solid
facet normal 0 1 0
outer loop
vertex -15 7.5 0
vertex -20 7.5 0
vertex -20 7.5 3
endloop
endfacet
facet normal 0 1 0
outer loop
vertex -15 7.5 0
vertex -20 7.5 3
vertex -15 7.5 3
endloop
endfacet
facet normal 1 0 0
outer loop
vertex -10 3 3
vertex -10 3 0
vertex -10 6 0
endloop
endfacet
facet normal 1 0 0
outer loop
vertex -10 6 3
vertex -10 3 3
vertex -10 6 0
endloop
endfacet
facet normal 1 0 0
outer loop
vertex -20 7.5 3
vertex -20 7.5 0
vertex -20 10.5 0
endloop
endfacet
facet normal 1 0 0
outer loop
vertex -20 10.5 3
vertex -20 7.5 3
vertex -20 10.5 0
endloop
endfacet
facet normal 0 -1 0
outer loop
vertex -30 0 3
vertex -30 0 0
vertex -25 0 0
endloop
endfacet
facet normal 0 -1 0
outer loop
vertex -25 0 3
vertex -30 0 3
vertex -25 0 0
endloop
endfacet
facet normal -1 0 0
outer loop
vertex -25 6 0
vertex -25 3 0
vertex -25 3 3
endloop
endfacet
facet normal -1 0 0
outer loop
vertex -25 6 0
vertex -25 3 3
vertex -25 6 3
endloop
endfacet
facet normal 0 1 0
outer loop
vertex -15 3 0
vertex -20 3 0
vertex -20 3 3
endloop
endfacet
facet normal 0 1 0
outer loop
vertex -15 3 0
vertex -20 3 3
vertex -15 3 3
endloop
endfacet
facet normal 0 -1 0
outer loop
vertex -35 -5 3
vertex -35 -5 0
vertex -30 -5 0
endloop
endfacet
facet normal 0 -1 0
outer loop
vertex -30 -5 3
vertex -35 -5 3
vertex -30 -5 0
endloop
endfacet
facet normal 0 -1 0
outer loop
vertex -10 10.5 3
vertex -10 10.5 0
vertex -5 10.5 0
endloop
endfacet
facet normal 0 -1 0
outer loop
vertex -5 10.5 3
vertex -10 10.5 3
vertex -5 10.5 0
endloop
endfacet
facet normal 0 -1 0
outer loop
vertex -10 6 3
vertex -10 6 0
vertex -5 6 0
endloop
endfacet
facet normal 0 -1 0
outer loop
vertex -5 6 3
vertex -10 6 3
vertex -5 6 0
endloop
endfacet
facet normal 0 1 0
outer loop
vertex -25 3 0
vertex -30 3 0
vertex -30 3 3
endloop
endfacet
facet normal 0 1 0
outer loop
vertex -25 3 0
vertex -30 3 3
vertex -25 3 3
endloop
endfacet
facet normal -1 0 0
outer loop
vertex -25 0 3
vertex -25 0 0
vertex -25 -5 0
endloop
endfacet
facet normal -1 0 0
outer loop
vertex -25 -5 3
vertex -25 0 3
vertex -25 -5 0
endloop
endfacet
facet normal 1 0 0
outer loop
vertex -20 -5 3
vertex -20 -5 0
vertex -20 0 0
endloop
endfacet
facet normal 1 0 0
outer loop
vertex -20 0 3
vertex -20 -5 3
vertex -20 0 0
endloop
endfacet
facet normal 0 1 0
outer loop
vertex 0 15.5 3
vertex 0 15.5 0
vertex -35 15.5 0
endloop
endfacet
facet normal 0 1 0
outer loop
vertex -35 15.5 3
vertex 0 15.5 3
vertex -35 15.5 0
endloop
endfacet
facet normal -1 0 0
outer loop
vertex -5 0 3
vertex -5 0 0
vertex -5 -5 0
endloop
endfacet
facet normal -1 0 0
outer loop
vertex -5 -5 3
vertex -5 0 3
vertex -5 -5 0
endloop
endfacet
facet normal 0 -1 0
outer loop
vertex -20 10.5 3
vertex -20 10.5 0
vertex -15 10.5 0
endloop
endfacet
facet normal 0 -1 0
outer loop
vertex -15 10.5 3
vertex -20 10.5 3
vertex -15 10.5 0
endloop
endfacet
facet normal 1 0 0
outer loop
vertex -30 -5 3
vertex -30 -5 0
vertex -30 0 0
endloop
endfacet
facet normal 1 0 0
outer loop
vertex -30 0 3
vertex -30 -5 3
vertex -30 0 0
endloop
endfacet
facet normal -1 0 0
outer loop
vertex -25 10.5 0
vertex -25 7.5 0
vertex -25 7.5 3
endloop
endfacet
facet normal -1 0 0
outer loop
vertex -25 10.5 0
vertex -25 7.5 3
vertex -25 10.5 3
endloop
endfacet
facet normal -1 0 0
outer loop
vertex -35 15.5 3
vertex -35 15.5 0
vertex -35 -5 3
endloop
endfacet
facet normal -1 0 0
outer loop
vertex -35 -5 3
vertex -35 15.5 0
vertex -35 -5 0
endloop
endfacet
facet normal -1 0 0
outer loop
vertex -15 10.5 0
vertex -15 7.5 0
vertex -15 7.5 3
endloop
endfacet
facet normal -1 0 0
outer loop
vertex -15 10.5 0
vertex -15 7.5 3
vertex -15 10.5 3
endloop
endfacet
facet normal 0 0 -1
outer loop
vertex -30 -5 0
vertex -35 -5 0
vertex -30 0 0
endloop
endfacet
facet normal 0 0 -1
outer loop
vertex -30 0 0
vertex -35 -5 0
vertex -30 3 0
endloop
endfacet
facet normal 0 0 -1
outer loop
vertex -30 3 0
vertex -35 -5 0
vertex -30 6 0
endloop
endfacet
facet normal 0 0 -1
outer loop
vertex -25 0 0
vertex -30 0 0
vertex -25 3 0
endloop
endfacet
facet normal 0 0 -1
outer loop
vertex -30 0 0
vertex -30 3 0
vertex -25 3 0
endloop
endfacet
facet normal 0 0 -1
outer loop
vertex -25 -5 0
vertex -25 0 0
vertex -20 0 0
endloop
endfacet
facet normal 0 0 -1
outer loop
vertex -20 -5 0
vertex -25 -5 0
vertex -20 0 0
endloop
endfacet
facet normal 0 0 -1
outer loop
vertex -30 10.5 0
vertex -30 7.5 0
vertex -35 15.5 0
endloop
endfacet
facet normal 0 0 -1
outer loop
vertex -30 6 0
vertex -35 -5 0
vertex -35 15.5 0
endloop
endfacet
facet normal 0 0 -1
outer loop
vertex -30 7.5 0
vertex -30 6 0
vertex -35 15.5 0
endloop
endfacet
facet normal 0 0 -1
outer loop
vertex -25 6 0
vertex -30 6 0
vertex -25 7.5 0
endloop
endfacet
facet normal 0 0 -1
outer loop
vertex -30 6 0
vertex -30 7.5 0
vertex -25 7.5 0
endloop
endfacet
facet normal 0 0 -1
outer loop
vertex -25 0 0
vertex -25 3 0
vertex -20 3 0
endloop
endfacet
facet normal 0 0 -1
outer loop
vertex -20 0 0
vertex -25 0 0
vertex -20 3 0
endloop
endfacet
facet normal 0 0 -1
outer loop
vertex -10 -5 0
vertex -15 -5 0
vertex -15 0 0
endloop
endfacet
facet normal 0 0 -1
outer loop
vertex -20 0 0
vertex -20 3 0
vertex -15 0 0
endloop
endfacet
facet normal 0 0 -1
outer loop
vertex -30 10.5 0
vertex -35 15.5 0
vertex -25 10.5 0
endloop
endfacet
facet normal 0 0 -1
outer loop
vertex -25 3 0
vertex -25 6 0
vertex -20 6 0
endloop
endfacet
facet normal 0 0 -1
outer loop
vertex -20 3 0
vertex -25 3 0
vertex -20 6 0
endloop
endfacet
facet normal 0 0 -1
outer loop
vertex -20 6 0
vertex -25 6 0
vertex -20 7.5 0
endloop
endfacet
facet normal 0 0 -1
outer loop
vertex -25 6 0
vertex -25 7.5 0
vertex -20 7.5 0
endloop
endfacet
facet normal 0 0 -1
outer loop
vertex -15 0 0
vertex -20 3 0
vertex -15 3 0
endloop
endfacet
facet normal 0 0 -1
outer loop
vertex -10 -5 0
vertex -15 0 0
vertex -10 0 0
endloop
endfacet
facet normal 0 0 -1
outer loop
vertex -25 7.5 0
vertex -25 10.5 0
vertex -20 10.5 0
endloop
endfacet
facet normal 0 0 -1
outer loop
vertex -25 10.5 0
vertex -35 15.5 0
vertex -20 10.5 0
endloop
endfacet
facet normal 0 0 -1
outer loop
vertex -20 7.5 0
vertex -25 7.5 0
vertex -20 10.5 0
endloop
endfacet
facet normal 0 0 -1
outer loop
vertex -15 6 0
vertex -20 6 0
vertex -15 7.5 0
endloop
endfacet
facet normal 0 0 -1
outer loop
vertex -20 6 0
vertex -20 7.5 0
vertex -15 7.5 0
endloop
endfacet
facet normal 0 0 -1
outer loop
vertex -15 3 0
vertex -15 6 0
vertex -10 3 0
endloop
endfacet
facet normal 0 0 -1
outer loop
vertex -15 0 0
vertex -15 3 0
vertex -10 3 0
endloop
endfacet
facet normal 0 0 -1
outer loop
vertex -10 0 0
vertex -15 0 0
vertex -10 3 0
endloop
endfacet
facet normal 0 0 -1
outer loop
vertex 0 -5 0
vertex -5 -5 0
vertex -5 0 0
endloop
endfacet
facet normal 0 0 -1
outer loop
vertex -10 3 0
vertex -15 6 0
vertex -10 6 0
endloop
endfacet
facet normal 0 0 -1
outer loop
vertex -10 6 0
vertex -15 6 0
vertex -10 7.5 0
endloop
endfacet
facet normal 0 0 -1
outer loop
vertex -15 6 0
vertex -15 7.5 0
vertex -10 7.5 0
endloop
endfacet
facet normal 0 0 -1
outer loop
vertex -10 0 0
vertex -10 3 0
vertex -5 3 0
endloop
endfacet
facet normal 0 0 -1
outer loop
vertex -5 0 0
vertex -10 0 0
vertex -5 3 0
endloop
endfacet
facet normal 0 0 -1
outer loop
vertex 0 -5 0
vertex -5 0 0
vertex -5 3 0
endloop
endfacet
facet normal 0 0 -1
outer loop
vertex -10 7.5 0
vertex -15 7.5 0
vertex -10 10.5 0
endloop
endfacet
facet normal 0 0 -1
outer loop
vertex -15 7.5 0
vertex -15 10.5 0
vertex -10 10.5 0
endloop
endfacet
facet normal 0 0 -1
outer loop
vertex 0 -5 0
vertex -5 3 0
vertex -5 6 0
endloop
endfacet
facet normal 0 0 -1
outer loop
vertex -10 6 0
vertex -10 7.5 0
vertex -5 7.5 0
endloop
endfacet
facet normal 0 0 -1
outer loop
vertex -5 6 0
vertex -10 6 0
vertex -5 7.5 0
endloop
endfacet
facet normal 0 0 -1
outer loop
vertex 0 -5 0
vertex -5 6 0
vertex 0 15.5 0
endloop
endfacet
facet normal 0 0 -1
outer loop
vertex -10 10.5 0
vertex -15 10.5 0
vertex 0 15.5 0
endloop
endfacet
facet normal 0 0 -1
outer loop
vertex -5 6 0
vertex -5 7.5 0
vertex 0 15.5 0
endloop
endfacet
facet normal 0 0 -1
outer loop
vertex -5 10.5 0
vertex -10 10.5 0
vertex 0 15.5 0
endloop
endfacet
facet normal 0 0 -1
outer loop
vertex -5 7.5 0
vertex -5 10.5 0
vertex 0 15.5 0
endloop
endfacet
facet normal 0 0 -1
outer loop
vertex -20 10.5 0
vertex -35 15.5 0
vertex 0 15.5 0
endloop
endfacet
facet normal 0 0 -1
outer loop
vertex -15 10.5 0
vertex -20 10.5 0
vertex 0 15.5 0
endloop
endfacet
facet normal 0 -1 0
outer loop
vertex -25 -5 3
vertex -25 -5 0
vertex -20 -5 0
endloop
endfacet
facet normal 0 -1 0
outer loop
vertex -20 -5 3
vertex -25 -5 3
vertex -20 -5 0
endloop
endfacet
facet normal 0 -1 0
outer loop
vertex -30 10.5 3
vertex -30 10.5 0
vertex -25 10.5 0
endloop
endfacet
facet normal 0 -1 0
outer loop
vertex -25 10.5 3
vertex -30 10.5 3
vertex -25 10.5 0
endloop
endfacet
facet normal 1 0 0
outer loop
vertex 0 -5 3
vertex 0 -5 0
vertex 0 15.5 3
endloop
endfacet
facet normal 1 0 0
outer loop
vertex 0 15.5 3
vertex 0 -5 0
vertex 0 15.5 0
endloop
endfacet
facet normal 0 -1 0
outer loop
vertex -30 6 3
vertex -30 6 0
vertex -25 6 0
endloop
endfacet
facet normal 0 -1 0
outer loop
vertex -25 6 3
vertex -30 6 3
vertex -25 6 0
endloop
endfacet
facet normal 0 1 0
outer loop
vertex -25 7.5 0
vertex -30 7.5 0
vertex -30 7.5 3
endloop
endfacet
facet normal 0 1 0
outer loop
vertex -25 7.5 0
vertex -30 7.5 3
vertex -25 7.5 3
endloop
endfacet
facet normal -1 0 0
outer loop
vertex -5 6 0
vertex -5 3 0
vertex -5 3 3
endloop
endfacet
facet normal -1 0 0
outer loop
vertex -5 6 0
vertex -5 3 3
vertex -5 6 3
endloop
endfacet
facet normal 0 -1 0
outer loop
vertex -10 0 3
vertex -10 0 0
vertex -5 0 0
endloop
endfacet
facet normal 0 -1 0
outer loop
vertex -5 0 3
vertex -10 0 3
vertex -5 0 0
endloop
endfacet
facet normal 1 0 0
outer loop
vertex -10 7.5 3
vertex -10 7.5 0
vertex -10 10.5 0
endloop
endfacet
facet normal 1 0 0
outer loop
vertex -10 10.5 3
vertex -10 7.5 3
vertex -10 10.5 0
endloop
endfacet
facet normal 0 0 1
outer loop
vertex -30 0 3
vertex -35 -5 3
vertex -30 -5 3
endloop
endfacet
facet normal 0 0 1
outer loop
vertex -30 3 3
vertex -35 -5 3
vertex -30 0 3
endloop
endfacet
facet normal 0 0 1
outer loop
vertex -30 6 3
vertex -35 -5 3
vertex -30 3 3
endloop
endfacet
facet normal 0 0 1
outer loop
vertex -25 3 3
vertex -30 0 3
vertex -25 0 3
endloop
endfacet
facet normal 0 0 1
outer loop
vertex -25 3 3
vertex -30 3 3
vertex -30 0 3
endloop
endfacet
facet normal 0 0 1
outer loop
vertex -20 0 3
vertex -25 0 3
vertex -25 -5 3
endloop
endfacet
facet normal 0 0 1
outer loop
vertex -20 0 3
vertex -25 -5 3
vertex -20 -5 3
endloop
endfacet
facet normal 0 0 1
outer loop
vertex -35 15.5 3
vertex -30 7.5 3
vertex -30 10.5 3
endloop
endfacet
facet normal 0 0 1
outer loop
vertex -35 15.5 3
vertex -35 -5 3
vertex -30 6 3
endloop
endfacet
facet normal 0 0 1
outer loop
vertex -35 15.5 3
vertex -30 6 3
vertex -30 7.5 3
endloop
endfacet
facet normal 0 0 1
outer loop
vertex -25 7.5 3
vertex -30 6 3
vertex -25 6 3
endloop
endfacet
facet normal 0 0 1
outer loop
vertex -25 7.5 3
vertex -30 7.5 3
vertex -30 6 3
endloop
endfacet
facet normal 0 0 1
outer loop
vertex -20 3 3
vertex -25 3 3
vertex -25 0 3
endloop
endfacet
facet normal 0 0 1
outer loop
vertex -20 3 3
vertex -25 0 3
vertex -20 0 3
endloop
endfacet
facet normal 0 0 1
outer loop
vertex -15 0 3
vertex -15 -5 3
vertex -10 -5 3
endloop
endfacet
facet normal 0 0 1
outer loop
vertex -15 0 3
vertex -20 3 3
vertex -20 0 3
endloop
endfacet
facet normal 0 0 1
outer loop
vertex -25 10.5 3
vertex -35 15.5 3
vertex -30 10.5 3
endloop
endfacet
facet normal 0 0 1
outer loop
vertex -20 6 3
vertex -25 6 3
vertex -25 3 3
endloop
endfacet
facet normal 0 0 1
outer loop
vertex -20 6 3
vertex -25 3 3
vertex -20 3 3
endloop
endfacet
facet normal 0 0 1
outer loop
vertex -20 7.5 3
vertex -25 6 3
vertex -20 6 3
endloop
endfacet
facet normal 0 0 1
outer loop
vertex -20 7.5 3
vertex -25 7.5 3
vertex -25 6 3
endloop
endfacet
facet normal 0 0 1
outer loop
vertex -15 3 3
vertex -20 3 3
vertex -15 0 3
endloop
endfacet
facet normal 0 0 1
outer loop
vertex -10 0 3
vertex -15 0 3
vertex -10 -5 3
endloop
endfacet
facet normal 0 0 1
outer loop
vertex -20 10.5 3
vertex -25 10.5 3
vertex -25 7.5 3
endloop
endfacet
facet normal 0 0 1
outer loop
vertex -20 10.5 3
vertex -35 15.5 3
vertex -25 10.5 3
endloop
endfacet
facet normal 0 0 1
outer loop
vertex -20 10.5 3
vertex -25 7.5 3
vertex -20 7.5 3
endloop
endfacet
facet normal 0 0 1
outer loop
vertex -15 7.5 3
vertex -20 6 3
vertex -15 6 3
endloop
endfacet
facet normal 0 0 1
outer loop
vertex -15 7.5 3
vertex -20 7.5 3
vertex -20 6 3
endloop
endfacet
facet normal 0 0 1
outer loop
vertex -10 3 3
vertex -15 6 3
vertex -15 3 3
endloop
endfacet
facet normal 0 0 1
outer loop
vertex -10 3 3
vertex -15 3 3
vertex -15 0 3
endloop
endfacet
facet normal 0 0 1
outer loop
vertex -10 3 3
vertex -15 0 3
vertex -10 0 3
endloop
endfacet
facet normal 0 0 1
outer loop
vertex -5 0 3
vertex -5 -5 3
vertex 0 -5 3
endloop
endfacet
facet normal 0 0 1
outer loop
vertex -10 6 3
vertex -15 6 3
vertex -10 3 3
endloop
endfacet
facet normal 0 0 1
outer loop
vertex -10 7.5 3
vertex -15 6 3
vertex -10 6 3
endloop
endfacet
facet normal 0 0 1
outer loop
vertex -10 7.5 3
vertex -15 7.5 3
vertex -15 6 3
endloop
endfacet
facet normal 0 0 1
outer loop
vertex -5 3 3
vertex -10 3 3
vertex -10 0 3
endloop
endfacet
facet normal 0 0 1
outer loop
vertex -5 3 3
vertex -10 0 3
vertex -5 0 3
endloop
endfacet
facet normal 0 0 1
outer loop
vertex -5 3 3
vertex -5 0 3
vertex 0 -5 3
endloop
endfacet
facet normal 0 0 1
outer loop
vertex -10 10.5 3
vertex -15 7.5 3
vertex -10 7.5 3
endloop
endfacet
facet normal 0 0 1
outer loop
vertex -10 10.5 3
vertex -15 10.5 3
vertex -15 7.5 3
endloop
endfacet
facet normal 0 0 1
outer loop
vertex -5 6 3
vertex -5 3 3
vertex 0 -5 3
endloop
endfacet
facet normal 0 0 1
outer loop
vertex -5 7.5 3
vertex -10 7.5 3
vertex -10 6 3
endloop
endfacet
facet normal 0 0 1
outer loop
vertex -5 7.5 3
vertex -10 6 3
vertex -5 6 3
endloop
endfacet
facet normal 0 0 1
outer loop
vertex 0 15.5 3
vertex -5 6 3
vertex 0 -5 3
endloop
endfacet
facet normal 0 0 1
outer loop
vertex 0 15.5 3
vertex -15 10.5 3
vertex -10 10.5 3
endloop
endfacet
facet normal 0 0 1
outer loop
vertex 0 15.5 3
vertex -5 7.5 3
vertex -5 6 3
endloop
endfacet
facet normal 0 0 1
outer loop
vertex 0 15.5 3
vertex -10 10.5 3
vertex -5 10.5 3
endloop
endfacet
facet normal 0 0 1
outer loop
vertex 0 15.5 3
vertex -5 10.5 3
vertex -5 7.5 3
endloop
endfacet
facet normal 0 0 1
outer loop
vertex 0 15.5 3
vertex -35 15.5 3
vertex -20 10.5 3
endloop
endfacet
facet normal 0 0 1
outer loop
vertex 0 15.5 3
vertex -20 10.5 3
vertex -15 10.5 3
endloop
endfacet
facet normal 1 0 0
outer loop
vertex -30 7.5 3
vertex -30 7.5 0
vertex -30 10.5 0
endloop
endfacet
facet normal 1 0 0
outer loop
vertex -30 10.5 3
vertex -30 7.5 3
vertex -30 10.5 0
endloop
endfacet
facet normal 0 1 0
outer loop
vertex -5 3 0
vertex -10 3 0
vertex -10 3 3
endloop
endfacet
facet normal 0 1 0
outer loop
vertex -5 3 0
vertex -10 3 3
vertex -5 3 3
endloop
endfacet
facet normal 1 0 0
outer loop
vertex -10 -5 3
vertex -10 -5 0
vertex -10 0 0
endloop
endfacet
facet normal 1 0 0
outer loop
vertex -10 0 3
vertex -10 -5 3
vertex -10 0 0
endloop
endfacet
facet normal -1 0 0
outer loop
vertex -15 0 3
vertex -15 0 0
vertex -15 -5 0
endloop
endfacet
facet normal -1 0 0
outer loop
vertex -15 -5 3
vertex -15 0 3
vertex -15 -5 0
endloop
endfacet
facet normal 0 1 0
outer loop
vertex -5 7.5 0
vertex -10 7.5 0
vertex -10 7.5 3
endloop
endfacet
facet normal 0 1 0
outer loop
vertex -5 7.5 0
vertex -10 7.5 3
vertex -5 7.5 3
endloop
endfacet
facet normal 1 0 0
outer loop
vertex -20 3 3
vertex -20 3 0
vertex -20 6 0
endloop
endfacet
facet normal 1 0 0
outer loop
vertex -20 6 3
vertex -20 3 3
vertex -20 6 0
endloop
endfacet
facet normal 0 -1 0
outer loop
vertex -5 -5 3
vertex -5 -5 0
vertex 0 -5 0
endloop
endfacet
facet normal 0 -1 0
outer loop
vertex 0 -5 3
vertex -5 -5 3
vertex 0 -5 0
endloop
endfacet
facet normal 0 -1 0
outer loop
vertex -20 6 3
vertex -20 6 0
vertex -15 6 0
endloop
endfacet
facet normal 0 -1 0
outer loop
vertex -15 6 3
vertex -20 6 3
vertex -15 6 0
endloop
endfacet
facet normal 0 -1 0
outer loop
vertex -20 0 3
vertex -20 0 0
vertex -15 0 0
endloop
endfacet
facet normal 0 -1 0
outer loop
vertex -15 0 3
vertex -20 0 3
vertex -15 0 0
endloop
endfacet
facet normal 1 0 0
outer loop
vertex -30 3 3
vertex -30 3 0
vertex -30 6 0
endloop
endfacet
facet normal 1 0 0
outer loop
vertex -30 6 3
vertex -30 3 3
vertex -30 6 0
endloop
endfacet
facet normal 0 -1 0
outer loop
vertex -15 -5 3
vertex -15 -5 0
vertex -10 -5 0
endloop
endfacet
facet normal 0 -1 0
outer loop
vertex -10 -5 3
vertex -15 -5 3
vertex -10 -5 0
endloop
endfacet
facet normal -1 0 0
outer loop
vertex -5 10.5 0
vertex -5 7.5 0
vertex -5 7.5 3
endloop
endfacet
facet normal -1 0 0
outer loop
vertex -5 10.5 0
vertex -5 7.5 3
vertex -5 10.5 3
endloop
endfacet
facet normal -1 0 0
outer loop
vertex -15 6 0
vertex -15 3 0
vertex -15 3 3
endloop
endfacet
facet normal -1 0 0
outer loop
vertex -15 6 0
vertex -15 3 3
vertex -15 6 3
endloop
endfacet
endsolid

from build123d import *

# Parameters (mm, degrees)
ESQUISSE1_W        = 5
ESQUISSE1_H        = 3
BOSS_EXTRU_1_DEPTH = 3


with BuildPart() as part:
    # Esquisse1 → Boss.-Extru.1 (new body)
    with BuildSketch(Plane.XY):
        Polygon((-20, -5), (-20, 0), (-15, 0), (-15, -5), (-10, -5), (-10, 0), (-5, 0), (-5, -5), (0, -5), (0, 15.5), (-35, 15.5), (-35, -5), (-30, -5), (-30, 0), (-25, 0), (-25, -5), align=None)
        with Locations((-7.5, 9)):
            Rectangle(ESQUISSE1_W, ESQUISSE1_H, mode=Mode.SUBTRACT)
        with Locations((-17.5, 9)):
            Rectangle(ESQUISSE1_W, ESQUISSE1_H, mode=Mode.SUBTRACT)
        with Locations((-27.5, 9)):
            Rectangle(ESQUISSE1_W, ESQUISSE1_H, mode=Mode.SUBTRACT)
        with Locations((-7.5, 4.5)):
            Rectangle(ESQUISSE1_W, ESQUISSE1_H, mode=Mode.SUBTRACT)
        with Locations((-17.5, 4.5)):
            Rectangle(ESQUISSE1_W, ESQUISSE1_H, mode=Mode.SUBTRACT)
        with Locations((-27.5, 4.5)):
            Rectangle(ESQUISSE1_W, ESQUISSE1_H, mode=Mode.SUBTRACT)
    extrude(amount=BOSS_EXTRU_1_DEPTH)


solid = part.part
